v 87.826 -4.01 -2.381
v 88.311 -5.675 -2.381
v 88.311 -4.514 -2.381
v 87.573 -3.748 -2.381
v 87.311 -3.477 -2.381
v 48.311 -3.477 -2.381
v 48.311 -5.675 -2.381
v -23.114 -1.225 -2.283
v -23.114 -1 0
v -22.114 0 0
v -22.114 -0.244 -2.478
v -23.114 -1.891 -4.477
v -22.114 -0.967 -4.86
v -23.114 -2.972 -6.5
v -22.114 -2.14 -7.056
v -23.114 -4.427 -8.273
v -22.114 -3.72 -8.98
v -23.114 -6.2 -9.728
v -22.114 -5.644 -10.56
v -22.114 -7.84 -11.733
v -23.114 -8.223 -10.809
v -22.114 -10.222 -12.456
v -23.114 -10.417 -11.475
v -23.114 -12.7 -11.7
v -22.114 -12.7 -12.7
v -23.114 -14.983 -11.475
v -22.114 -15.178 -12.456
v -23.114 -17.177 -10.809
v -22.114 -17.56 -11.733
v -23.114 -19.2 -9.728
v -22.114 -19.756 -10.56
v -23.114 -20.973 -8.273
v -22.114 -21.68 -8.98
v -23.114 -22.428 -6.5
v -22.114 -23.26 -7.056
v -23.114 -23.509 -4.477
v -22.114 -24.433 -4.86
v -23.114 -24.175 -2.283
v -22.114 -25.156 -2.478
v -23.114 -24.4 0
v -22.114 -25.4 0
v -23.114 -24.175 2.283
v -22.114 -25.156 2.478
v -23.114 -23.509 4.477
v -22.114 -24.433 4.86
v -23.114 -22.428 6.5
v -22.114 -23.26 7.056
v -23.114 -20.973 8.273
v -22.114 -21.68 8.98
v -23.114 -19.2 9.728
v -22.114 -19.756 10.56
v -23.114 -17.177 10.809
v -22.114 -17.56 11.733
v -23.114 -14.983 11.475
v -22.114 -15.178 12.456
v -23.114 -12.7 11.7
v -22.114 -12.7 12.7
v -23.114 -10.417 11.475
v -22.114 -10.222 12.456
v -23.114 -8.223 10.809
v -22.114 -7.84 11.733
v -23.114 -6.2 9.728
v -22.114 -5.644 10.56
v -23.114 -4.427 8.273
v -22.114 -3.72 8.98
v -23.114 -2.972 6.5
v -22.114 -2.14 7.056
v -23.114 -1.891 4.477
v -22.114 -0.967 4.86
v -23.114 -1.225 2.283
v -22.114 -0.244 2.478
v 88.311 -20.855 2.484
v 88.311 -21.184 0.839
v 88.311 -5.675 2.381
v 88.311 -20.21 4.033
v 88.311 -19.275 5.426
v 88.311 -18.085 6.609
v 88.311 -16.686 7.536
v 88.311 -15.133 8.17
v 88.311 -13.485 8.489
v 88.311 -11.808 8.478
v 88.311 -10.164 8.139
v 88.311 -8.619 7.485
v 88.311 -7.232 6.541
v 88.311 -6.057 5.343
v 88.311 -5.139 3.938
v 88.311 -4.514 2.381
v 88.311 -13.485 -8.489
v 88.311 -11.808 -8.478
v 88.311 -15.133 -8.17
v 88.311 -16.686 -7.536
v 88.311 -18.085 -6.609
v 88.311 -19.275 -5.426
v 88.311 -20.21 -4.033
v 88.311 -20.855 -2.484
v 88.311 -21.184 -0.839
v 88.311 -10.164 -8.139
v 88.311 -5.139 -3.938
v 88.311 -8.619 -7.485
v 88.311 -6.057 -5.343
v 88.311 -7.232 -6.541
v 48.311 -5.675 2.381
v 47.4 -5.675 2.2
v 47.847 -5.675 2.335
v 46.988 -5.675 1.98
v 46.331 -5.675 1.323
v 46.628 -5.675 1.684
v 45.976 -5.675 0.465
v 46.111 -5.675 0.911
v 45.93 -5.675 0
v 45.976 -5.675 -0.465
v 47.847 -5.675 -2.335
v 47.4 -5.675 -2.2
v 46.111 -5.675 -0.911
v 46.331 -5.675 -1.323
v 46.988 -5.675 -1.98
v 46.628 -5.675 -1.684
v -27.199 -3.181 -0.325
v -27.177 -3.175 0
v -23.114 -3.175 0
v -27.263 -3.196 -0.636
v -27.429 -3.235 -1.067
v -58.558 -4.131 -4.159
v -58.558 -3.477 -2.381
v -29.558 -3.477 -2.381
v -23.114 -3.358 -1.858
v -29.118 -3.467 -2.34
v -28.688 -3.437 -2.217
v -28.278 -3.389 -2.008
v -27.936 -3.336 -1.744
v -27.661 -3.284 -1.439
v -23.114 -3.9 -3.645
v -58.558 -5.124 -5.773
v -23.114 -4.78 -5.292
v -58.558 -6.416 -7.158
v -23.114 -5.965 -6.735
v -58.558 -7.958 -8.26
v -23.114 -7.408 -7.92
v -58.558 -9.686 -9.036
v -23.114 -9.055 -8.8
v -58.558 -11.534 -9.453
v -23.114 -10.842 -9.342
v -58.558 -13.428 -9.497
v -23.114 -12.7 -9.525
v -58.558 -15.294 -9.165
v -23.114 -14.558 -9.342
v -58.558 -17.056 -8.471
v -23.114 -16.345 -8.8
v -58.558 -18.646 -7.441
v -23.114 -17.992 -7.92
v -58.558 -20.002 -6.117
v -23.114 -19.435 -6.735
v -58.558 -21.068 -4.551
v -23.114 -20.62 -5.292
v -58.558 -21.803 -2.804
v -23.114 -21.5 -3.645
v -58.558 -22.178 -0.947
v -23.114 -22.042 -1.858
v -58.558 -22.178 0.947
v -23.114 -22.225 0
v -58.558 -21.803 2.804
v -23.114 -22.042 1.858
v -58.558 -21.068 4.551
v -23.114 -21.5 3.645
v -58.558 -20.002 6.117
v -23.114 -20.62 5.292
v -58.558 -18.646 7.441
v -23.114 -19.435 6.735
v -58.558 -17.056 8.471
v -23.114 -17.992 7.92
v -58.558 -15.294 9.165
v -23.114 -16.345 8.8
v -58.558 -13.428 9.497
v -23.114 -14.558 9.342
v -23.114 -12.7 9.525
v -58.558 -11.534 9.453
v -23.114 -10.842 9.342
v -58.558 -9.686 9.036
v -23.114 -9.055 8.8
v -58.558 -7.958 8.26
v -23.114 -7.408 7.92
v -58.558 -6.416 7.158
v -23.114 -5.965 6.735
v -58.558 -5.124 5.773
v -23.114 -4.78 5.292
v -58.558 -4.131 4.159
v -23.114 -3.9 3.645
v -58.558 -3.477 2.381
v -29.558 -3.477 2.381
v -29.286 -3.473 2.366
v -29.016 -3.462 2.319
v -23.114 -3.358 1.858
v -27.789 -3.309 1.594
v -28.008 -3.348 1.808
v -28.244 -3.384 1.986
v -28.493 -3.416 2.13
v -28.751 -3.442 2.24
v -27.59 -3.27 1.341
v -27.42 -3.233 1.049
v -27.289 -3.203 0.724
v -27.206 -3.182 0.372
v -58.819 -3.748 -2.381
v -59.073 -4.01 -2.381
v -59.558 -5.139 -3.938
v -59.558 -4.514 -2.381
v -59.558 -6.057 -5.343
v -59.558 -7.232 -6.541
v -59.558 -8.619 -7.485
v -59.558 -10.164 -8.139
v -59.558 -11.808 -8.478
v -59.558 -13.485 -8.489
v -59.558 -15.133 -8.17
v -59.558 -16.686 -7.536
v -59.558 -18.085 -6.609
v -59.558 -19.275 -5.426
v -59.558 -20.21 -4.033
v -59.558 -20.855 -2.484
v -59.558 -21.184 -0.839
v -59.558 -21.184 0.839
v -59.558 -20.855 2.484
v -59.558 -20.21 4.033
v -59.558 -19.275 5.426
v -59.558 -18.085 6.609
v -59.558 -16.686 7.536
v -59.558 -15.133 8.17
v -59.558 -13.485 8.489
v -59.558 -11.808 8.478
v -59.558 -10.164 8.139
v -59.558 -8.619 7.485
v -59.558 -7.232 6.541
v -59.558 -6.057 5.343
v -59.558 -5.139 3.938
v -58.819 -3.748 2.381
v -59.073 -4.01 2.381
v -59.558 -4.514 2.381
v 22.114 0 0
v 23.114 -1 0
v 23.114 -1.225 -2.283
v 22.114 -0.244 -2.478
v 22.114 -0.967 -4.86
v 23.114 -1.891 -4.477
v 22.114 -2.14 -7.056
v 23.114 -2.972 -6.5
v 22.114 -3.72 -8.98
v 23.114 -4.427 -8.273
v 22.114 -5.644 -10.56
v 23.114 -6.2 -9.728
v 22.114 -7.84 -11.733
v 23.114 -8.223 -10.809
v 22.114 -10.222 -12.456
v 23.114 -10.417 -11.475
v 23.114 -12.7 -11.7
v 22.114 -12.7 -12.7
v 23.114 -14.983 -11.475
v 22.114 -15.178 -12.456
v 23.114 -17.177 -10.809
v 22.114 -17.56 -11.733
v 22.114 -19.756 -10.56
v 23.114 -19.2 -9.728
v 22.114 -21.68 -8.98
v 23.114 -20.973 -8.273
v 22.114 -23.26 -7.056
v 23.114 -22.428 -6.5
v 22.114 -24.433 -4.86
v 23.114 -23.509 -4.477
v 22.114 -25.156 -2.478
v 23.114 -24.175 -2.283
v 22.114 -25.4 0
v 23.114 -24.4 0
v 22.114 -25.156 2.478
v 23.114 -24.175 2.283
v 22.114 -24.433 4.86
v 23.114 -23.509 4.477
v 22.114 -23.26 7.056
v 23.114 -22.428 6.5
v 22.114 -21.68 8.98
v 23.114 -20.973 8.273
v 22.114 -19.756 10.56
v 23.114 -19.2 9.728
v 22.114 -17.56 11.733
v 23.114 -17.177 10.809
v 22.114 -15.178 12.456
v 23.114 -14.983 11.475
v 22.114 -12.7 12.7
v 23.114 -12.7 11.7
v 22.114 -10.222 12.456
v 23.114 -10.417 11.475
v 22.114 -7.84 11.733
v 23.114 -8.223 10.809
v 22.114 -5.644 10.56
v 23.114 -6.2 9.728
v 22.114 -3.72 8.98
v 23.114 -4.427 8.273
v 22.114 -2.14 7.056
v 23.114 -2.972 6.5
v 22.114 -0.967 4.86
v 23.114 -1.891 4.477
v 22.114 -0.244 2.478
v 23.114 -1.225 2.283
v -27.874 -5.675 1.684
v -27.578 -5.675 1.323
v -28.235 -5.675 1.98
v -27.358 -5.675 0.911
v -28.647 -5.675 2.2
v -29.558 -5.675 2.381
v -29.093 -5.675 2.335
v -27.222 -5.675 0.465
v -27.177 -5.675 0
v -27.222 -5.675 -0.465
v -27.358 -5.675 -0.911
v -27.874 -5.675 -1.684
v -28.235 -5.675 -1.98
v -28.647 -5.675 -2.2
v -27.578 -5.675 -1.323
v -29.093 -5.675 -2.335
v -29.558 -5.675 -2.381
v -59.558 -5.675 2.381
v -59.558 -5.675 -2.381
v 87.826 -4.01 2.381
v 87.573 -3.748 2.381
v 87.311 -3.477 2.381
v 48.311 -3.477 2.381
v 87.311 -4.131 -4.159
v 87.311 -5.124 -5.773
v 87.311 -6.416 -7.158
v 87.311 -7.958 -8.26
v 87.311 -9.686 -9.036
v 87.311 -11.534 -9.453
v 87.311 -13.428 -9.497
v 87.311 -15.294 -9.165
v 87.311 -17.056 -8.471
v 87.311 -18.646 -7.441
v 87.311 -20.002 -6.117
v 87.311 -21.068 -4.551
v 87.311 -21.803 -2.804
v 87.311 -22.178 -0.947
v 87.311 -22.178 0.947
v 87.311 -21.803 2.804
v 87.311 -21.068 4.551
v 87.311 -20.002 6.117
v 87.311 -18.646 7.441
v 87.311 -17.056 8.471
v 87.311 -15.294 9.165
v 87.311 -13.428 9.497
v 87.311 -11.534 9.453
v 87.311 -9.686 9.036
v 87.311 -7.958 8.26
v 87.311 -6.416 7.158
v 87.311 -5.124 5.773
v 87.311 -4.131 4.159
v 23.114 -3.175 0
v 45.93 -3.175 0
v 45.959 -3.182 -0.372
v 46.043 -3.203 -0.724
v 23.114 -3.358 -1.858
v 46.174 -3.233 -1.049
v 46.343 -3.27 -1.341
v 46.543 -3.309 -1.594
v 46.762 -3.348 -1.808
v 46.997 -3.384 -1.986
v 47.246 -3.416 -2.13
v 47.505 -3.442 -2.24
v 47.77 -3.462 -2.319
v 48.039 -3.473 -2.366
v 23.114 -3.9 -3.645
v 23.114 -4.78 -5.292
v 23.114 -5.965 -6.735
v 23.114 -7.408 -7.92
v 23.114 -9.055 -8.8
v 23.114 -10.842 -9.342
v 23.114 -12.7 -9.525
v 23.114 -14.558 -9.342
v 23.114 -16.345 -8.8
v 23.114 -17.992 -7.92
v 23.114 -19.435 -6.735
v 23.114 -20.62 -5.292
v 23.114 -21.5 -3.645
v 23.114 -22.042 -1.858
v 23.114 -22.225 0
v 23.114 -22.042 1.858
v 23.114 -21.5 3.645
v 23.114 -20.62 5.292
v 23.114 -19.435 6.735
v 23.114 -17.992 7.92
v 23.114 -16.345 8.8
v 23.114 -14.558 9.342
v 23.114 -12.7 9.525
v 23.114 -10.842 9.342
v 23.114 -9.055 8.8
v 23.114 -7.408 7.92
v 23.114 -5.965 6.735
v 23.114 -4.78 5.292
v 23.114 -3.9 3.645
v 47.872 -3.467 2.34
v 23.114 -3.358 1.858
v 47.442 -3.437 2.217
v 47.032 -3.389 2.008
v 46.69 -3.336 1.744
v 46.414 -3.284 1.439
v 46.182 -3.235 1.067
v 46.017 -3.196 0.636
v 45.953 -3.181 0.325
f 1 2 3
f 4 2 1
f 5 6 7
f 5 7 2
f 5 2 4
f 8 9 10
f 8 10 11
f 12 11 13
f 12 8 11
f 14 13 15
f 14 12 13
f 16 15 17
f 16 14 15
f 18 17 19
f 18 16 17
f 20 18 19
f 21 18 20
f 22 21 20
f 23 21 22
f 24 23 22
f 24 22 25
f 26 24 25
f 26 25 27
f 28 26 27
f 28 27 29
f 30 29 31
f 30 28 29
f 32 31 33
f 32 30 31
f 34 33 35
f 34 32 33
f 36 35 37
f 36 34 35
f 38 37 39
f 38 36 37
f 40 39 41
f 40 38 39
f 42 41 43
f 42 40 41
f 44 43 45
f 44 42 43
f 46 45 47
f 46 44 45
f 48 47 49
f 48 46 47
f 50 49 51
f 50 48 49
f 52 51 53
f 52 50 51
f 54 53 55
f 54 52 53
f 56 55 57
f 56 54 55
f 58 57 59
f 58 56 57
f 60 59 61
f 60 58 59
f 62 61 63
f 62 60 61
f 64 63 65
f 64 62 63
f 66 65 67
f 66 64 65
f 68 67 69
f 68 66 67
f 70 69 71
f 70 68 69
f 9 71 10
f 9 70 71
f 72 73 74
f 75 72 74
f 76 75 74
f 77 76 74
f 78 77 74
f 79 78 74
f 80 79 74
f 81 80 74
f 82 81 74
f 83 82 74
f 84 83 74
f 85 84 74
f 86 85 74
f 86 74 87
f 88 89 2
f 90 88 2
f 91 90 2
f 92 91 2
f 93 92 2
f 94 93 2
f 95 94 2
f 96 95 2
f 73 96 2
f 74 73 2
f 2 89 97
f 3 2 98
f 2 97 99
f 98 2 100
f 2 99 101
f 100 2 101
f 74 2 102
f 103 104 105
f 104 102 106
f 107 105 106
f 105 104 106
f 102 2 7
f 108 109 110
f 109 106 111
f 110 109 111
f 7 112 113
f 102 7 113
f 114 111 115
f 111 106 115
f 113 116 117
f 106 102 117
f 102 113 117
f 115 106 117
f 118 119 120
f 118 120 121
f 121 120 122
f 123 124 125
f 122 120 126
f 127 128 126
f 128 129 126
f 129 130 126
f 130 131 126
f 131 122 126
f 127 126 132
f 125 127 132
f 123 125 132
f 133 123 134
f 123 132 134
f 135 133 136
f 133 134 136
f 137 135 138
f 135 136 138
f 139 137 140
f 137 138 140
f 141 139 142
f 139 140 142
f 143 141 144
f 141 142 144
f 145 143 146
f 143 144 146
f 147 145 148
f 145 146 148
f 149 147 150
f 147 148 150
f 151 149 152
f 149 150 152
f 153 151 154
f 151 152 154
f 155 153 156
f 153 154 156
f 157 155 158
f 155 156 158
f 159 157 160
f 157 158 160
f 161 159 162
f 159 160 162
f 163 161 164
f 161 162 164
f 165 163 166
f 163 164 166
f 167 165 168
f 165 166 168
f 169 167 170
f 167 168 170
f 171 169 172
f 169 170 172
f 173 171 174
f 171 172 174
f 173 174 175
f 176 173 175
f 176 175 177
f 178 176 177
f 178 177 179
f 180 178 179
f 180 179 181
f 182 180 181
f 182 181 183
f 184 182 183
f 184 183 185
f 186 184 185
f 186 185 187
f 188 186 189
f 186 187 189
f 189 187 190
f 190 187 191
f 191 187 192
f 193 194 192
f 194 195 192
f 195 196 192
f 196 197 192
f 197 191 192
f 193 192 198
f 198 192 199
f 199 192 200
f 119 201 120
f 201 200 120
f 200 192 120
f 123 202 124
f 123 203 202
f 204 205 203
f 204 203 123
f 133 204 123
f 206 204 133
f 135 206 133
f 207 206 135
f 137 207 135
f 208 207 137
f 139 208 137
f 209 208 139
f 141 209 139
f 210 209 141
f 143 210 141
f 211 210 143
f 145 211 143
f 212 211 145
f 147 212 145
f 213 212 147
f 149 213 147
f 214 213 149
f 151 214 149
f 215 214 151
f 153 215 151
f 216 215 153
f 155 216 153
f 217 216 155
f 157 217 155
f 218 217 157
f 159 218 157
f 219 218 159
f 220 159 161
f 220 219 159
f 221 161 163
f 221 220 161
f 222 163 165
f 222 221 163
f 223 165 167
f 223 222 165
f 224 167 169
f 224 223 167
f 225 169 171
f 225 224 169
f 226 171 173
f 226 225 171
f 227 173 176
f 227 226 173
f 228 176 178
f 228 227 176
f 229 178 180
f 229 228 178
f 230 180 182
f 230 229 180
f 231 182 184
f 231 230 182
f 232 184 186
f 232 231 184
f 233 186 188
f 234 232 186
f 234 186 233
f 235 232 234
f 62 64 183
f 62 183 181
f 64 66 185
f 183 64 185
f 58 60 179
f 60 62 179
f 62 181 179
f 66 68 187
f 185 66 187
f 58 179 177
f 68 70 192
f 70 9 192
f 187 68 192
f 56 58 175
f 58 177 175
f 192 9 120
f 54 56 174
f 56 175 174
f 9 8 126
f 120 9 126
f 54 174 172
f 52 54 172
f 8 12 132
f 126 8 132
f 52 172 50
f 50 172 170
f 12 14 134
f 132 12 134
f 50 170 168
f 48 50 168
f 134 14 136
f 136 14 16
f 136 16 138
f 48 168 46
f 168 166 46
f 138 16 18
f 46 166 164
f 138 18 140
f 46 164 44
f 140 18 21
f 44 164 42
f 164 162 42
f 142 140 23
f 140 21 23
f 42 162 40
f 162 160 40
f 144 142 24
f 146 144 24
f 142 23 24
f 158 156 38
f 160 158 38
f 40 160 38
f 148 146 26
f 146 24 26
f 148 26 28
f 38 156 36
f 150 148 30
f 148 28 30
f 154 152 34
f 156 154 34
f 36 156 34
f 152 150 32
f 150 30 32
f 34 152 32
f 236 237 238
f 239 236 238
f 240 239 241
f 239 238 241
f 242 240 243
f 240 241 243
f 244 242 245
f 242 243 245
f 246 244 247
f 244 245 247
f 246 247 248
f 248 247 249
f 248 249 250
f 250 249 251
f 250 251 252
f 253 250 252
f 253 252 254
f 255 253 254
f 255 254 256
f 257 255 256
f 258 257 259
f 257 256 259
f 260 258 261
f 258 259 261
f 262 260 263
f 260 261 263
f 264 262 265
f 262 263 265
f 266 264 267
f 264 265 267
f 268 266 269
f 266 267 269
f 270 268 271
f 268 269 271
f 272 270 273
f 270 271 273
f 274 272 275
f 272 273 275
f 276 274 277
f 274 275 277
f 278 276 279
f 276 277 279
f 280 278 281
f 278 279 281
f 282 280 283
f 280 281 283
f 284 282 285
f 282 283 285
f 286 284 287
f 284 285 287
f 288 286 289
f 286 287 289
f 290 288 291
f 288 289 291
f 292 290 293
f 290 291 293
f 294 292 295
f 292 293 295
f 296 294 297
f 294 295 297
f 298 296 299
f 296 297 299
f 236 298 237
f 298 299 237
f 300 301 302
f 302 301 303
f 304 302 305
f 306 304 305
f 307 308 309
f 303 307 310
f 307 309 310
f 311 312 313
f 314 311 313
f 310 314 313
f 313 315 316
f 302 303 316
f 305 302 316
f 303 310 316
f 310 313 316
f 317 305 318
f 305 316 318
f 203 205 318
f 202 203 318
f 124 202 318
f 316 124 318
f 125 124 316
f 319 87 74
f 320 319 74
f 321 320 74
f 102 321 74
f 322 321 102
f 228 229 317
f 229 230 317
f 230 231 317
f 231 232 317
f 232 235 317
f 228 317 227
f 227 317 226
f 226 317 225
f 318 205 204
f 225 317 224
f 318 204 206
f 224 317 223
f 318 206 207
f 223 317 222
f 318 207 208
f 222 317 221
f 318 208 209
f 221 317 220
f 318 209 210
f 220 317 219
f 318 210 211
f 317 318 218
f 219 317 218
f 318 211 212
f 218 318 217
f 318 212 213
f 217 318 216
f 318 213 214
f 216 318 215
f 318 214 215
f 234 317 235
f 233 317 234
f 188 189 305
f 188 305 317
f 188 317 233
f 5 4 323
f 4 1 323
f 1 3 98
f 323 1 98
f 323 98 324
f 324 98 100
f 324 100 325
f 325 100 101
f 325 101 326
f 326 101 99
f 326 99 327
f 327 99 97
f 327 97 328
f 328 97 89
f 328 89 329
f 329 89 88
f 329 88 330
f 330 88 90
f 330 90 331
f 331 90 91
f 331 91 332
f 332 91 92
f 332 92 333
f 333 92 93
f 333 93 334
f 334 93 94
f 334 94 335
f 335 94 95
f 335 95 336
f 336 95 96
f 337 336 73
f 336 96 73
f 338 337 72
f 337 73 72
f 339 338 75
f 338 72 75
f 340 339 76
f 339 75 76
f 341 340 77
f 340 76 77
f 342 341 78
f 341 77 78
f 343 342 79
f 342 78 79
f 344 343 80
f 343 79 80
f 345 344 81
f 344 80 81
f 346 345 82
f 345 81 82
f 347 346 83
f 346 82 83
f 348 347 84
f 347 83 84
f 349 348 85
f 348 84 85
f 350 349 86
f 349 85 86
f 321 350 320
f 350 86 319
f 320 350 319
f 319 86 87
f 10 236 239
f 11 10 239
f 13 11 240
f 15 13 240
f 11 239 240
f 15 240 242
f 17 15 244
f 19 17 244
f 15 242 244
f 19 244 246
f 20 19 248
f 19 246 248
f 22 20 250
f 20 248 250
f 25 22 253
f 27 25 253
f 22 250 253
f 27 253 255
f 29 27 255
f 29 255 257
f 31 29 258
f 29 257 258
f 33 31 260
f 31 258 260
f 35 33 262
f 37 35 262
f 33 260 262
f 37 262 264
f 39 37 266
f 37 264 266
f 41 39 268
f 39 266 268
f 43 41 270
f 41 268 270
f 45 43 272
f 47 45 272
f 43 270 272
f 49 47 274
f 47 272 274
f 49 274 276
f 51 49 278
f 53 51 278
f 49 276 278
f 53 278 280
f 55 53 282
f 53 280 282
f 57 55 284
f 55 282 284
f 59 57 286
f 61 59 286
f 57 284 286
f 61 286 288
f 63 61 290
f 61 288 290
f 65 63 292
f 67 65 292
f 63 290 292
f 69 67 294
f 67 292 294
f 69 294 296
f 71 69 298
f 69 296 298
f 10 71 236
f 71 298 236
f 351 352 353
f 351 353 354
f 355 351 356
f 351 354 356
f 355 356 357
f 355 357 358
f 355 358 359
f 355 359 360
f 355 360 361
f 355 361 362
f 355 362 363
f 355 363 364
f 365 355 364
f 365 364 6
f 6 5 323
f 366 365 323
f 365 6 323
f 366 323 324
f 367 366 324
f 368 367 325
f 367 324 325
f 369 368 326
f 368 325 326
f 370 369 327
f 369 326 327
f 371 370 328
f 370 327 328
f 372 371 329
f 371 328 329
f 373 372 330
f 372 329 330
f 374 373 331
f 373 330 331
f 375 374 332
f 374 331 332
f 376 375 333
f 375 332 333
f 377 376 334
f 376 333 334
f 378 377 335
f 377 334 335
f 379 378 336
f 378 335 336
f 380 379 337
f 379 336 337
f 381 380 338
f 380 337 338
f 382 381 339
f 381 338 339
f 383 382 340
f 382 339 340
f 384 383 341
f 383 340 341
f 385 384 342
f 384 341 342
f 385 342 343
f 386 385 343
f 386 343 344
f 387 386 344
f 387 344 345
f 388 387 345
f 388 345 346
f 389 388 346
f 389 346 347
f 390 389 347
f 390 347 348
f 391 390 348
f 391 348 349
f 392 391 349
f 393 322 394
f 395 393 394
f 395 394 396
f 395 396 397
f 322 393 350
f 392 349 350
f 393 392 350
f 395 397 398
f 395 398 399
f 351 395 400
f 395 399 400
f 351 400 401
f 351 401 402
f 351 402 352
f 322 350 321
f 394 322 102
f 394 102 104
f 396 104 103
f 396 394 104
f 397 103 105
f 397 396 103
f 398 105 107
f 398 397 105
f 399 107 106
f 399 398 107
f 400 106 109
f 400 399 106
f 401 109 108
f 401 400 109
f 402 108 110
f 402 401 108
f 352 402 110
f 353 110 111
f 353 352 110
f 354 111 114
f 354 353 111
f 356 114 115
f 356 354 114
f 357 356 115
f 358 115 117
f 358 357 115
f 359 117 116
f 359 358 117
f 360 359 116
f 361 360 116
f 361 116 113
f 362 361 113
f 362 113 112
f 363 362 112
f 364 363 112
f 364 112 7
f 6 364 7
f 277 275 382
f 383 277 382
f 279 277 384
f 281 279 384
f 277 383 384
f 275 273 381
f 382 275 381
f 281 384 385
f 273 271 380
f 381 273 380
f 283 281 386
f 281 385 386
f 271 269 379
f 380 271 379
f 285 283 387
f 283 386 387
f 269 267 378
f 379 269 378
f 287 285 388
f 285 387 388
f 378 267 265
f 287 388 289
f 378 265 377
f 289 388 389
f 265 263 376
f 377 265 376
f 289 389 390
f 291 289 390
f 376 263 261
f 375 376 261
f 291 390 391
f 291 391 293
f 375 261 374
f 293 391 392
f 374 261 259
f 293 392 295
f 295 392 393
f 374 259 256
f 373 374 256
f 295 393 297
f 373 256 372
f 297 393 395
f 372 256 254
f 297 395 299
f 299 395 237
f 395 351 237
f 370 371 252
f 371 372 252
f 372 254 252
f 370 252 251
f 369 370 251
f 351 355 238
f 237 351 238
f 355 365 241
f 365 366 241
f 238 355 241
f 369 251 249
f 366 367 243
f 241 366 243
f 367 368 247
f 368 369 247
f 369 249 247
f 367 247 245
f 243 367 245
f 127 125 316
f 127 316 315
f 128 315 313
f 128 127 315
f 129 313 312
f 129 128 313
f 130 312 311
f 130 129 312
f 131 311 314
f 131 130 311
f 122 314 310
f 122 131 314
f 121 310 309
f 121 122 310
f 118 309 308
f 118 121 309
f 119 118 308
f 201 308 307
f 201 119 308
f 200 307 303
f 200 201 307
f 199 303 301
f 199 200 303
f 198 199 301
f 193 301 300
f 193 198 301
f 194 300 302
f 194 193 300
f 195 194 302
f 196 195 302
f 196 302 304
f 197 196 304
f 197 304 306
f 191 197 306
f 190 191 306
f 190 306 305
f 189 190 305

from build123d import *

# Parameters (mm, degrees)
CORTAR_EXTRUIR1_DEPTH = 2.5
CHAFL_N1_SIZE         = 1


with BuildPart() as part:
    # Croquis1 → Revolución1 (revolve)
    with BuildSketch(Plane.XY):
        Polygon((-23.114362081, 0), (23.114362081, 0), (23.114362081, -3.175), (88.311435021, -3.175), (88.311435021, -12.7), (-59.557840342, -12.7), (-59.557840342, -3.175), (-23.114362081, -3.175), align=None)
    revolve(axis=Axis((88.311435021, -12.7, 0), (-1, 0, 0)))

    # Croquis2 → Cortar-Extruir1 (cut)
    with BuildSketch(Plane(origin=(0, -3.175, 0), x_dir=(1, 0, 0), z_dir=(0, 1, 0))):
        with BuildLine():
            Line((48.311435021, 2.38125), (88.311435021, 2.38125))
            ThreePointArc((88.311435021, 2.38125), (90.692685021, 0), (88.311435021, -2.38125))
            Line((88.311435021, -2.38125), (48.311435021, -2.38125))
            ThreePointArc((48.311435021, -2.38125), (45.930185021, 0), (48.311435021, 2.38125))
        make_face()
        with BuildLine():
            Line((-59.557840342, 2.38125), (-29.557840342, 2.38125))
            ThreePointArc((-29.557840342, 2.38125), (-27.176590342, 0), (-29.557840342, -2.38125))
            Line((-29.557840342, -2.38125), (-59.557840342, -2.38125))
            ThreePointArc((-59.557840342, -2.38125), (-61.939090342, 0), (-59.557840342, 2.38125))
        make_face()
    extrude(amount=-CORTAR_EXTRUIR1_DEPTH, mode=Mode.SUBTRACT)

    # Chaflán1
    chafl_n1_edges = [part.edges().sort_by_distance(p)[0] for p in [
        (88.311435021, -22.225, 0),
        (-59.557840342, -22.225, 0),
        (23.114362081, -25.4, 0),
        (-23.114362081, -25.4, 0),
    ]]
    chamfer(chafl_n1_edges, length=CHAFL_N1_SIZE)


solid = part.part
